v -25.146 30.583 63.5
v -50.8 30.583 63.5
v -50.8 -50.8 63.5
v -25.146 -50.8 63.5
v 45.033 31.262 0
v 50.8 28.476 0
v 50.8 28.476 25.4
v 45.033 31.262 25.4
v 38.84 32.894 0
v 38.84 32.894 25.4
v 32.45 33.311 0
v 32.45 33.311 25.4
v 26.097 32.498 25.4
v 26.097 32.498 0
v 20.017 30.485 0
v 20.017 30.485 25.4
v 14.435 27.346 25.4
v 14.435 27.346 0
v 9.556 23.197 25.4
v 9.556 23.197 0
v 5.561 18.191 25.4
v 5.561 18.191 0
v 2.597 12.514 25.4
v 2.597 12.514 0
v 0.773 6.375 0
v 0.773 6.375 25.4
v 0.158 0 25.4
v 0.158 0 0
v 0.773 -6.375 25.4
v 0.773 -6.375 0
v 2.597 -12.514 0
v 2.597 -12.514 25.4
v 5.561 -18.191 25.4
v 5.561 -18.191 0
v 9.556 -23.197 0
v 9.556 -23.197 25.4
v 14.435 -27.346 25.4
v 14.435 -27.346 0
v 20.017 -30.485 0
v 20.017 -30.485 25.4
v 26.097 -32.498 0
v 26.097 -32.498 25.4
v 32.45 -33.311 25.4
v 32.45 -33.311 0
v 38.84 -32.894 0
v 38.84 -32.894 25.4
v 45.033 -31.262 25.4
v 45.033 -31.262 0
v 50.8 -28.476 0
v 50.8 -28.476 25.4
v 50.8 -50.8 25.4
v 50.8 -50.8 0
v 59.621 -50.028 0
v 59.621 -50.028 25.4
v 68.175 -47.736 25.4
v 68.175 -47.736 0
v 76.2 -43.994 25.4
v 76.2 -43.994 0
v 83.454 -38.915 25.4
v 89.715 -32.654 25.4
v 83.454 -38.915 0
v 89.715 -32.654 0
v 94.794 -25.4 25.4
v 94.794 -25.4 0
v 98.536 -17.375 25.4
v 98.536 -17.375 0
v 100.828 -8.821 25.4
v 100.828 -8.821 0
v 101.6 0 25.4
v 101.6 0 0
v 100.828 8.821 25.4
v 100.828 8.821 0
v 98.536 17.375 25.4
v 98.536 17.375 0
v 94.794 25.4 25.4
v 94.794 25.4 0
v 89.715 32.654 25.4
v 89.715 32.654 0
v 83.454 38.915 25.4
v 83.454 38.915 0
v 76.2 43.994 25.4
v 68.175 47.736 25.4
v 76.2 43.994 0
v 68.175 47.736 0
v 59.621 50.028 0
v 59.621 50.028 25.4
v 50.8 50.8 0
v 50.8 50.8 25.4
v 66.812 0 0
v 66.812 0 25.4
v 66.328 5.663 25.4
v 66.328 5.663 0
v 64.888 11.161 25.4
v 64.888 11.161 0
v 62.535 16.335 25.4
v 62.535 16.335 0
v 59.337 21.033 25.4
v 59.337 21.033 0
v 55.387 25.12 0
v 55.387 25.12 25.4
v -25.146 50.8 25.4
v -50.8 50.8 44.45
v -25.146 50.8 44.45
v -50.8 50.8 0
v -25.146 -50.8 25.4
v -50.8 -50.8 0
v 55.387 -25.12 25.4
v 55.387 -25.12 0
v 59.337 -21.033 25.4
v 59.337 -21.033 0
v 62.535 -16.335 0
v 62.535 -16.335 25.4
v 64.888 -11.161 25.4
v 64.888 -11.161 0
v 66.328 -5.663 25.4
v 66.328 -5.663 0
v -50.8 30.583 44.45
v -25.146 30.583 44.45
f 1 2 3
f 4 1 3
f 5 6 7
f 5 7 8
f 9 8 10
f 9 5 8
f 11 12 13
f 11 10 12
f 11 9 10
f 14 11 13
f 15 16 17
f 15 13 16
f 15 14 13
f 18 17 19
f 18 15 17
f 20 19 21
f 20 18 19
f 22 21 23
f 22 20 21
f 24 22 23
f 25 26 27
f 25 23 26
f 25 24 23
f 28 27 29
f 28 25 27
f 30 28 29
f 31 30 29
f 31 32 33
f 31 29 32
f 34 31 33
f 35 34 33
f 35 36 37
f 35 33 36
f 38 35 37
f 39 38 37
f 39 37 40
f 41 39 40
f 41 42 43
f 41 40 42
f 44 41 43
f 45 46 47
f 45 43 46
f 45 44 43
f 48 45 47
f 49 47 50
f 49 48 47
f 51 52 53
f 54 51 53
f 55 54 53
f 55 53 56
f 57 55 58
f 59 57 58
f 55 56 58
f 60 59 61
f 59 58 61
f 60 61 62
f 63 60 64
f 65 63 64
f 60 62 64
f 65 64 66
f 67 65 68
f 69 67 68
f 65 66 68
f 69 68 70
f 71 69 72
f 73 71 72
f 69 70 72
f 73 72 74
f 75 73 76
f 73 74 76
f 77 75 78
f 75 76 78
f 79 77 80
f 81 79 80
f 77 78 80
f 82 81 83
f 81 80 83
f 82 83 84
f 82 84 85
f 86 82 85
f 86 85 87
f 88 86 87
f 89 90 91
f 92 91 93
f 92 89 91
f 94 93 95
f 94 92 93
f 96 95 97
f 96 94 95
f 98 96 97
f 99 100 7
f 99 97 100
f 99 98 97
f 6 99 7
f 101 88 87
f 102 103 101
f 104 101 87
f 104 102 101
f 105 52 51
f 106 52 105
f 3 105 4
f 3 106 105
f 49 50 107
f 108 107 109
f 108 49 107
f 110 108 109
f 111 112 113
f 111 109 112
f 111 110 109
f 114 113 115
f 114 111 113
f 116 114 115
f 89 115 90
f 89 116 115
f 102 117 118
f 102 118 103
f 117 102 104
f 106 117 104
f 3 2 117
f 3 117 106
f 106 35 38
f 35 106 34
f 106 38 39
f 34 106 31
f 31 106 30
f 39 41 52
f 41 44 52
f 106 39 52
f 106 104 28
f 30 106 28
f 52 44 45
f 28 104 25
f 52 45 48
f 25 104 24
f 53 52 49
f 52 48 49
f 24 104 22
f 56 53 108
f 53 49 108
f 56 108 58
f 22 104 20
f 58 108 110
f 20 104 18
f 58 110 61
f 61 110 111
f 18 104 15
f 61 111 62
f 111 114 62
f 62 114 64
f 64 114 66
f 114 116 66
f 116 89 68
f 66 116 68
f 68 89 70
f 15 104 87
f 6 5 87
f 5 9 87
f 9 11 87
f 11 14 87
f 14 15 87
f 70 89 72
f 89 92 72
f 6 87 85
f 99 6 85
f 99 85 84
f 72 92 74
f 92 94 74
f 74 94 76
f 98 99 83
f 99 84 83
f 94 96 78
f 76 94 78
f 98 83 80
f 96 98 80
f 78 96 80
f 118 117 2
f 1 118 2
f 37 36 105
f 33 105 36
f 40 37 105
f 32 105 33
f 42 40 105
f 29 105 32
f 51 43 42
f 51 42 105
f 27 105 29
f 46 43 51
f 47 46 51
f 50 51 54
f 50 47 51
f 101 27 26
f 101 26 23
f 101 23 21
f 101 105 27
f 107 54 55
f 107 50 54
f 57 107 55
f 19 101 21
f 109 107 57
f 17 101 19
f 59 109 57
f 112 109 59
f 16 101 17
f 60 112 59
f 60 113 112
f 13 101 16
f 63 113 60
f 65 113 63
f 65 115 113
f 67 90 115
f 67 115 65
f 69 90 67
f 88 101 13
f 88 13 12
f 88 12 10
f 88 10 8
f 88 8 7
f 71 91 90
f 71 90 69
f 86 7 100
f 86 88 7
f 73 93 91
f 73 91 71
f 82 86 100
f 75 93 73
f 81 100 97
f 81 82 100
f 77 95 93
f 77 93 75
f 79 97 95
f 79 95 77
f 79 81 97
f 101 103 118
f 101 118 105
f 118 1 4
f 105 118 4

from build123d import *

# Parameters (mm, degrees)
F0_W     = 101.6
F0_H     = 101.6
F2_DEPTH = 25.4
F3_DEPTH = 54.864
F4_W     = 81.382974
F4_H     = 19.05
F5_DEPTH = 25.654


with BuildPart() as f2:
    # F0 (on Top) → F2 (new body)
    with BuildSketch(Plane.XY):
        Rectangle(F0_W, F0_H)
        with BuildLine():
            ThreePointArc((50.8, -50.8), (101.6, 0), (50.8, 50.8))
            Line((50.8, 50.8), (50.8, -50.8))
        make_face()
    extrude(amount=F2_DEPTH)

    # F1 (on face) → F3 (cut)
    with BuildSketch(Plane.XY):
        with BuildLine():
            ThreePointArc((50.8, -28.476143), (62.53461, -16.334626), (66.812163, 0))
            ThreePointArc((66.812163, 0), (62.53461, 16.334626), (50.8, 28.476143))
            Line((50.8, 28.476143), (50.8, -28.476143))
        make_face()
        with BuildLine():
            Line((50.8, -28.476143), (50.8, 28.476143))
            ThreePointArc((50.8, 28.476143), (0.157828, 0), (50.8, -28.476143))
        make_face()
    extrude(amount=F3_DEPTH, mode=Mode.SUBTRACT)

    # F4 (on face) → F5 (join)
    with BuildSketch(Plane(origin=(-50.8, 0, 0), x_dir=(0, -1, 0), z_dir=(-1, 0, 0))):
        with Locations((10.108513, 53.975)):
            Rectangle(F4_W, F4_H)
        Polygon((-30.582974, 44.45), (-50.8, 44.45), (-50.8, 25.4), (50.8, 25.4), (50.8, 44.45), align=None)
    extrude(amount=-F5_DEPTH)


solid = f2.part
